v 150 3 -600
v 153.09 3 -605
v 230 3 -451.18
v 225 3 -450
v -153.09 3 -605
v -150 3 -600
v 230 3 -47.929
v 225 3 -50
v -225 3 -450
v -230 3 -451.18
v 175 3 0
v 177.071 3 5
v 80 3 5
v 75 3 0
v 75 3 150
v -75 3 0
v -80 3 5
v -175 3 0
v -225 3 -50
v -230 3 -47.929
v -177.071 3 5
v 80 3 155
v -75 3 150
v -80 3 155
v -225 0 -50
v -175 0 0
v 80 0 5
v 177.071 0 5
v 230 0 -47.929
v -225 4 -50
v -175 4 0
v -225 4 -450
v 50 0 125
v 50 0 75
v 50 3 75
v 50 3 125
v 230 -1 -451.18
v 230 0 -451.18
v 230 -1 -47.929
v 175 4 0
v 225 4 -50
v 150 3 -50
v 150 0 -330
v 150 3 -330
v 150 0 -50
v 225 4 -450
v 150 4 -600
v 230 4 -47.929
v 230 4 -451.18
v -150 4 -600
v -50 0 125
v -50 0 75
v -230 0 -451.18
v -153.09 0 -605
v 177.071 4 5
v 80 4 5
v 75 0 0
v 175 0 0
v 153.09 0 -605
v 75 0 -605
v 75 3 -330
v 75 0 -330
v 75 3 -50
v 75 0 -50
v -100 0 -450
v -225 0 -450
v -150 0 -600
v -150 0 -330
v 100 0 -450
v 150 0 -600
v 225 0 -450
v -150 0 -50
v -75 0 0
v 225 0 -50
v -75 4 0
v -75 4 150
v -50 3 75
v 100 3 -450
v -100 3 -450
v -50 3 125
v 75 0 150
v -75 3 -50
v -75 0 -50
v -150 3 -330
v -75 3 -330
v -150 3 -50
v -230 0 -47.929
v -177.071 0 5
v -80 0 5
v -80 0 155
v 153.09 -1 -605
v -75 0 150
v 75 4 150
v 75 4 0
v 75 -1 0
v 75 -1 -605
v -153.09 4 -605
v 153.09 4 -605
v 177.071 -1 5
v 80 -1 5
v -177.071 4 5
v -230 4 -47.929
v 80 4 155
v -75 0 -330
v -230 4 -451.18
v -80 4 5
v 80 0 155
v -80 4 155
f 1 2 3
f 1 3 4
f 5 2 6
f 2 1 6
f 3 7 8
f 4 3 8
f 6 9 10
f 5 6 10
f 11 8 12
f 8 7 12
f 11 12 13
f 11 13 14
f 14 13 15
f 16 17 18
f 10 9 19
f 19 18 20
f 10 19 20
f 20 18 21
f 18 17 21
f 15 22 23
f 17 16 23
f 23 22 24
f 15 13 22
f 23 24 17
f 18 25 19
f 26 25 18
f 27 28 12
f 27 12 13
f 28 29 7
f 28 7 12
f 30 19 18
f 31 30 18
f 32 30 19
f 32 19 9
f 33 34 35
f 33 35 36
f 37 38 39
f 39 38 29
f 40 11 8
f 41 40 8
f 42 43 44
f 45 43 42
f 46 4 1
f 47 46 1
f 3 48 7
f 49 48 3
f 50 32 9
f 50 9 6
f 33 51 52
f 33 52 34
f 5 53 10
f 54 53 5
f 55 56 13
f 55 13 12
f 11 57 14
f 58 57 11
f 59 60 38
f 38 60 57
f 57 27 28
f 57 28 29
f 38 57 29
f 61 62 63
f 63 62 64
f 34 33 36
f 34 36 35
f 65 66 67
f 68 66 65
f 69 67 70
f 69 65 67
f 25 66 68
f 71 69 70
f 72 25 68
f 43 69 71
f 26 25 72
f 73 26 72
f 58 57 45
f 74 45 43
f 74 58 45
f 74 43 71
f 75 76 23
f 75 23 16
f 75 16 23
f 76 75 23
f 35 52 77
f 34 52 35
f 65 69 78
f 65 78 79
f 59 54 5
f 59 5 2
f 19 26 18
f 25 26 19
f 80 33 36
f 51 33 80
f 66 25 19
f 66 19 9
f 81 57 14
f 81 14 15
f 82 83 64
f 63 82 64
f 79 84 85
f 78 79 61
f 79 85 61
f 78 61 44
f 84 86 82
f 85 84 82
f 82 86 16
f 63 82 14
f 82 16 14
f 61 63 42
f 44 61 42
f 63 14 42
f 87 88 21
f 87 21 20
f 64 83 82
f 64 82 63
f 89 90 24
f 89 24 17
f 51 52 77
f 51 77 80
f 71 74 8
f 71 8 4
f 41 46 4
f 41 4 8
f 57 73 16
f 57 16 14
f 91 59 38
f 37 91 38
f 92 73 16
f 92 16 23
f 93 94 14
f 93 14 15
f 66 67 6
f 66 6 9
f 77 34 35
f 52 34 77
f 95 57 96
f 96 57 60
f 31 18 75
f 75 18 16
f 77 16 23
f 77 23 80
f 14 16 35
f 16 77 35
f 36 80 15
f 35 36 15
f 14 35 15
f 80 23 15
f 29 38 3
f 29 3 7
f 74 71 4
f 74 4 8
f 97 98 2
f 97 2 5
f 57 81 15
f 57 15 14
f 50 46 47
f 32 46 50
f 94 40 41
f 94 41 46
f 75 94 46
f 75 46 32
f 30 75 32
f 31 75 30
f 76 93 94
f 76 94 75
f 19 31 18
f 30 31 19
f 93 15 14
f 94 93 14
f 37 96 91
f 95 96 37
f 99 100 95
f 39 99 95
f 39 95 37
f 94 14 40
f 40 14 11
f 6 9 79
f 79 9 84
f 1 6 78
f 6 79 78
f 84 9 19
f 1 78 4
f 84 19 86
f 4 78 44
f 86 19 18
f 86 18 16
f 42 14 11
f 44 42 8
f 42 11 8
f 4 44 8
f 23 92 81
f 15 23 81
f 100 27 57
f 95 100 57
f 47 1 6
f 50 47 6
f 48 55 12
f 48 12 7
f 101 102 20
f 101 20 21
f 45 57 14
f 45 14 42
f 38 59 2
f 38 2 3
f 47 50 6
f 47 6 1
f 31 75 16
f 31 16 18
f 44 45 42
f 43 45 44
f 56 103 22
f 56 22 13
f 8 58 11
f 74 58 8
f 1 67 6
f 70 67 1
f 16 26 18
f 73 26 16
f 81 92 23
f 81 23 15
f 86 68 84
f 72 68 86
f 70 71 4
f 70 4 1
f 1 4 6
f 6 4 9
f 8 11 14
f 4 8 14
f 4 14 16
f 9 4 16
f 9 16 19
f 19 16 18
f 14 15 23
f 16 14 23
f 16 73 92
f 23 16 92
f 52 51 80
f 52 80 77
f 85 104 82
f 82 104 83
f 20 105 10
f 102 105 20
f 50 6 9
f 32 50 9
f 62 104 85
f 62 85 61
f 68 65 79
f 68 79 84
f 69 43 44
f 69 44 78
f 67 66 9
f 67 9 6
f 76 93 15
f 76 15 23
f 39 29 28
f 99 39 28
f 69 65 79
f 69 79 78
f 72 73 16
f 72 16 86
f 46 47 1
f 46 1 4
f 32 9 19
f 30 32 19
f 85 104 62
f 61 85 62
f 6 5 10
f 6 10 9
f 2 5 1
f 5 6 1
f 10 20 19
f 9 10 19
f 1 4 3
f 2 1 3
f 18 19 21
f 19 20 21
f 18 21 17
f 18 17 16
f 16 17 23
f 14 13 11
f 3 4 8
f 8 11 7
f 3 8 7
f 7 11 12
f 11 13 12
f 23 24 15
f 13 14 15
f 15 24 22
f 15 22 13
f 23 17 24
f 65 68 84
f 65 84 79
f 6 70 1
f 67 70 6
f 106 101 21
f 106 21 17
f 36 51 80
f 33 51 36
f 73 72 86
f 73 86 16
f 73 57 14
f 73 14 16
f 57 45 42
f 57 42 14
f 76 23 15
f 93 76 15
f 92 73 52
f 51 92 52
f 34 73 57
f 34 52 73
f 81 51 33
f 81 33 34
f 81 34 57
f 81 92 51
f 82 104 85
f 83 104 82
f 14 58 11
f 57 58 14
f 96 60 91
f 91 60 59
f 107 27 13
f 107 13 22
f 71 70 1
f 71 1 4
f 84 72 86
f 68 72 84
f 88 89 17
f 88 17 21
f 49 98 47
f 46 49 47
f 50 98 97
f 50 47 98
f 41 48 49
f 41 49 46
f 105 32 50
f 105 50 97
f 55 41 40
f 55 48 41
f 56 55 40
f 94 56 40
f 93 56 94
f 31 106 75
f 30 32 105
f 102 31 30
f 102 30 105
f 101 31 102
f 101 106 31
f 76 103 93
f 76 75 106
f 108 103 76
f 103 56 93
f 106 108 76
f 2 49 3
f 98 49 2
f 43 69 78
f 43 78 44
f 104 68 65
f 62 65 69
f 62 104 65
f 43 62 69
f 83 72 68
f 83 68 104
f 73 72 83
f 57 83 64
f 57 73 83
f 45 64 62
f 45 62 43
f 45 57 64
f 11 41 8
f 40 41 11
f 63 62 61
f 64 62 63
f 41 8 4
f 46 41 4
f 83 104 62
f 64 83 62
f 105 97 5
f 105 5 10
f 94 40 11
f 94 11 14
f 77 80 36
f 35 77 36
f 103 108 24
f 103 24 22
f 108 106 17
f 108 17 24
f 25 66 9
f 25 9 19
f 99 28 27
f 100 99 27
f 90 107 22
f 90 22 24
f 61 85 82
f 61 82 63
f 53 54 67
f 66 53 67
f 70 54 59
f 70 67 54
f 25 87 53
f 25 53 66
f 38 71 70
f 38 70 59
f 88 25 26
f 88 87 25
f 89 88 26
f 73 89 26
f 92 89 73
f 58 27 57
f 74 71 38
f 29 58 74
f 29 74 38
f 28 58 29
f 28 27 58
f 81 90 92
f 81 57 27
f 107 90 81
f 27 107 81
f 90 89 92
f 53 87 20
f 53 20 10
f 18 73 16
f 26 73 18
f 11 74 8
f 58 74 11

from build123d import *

# Parameters (mm, degrees)
F1_DEPTH  = 3
F2_W      = 150
F2_H      = 150
F3_DEPTH  = 3
F4_W      = 150
F4_H      = 280
F5_DEPTH  = 3
F6_W      = 150
F6_H      = 280
F7_DEPTH  = 3
F9_DEPTH  = 3
F11_DEPTH = 3
F13_DEPTH = 1
F15_DEPTH = 1
F17_DEPTH = 1


with BuildPart() as f1:
    # F0 (on Front) → F1 (new body)
    with BuildSketch(Plane.XZ):
        Polygon((50, 125), (0, 125), (-50, 125), (-50, 100), (-50, 75), (0, 75), (50, 75), (50, 100), align=None)
    extrude(amount=-F1_DEPTH)


with BuildPart() as f3:
    # F2 (on Front) → F3 (new body)
    with BuildSketch(Plane.XZ):
        with Locations((0, 75)):
            Rectangle(F2_W, F2_H)
        Polygon((-50, 125), (0, 125), (50, 125), (50, 100), (50, 75), (0, 75), (-50, 75), (-50, 100), align=None, mode=Mode.SUBTRACT)
    extrude(amount=-F3_DEPTH)


with BuildPart() as f5:
    # F4 (on Front) → F5 (new body)
    with BuildSketch(Plane.XZ):
        with Locations((0, -190)):
            Rectangle(F4_W, F4_H)
    extrude(amount=-F5_DEPTH)


with BuildPart() as f7:
    # F6 (on Front) → F7 (new body)
    with BuildSketch(Plane.XZ):
        Polygon((75, 0), (-75, 0), (-150, -50), (-150, -330), (-100, -450), (100, -450), (150, -330), (150, -50), align=None)
        with Locations((0, -190)):
            Rectangle(F6_W, F6_H, mode=Mode.SUBTRACT)
    extrude(amount=-F7_DEPTH)


with BuildPart() as f9:
    # F8 (on face) → F9 (new body)
    with BuildSketch(Plane.XZ):
        Polygon((175, 0), (75, 0), (150, -50), (150, -330), (100, -450), (-100, -450), (-150, -330), (-150, -50), (-75, 0), (-175, 0), (-225, -50), (-225, -450), (-150, -600), (150, -600), (225, -450), (225, -50), align=None)
    extrude(amount=-F9_DEPTH)


with BuildPart() as f11:
    # F10 (on face) → F11 (new body)
    with BuildSketch(Plane.XZ):
        Polygon((230, -47.928932), (177.071068, 5), (80, 5), (80, 155), (-80, 155), (-80, 5), (-177.071068, 5), (-230, -47.928932), (-230, -451.18034), (-153.09017, -605), (153.09017, -605), (230, -451.18034), align=None)
        Polygon((-75, 150), (75, 150), (75, 0), (175, 0), (225, -50), (225, -450), (150, -600), (-150, -600), (-225, -450), (-225, -50), (-175, 0), (-75, 0), align=None, mode=Mode.SUBTRACT)
    extrude(amount=-F11_DEPTH)


with BuildPart() as f13:
    # F12 (on face) → F13 (new body)
    with BuildSketch(Plane(origin=(0, 3, 0), x_dir=(-1, 0, 0), z_dir=(0, 1, 0))):
        Polygon((75, 0), (75, 150), (-75, 150), (-75, 0), (-175, 0), (-225, -50), (-225, -450), (-150, -600), (150, -600), (225, -450), (225, -50), (175, 0), align=None)
    extrude(amount=F13_DEPTH)


with BuildPart() as f15:
    # F14 (on face) → F15 (new body)
    with BuildSketch(Plane(origin=(0, 4, 0), x_dir=(-1, 0, 0), z_dir=(0, 1, 0))):
        Polygon((80, 155), (-80, 155), (-80, 5), (-177.071068, 5), (-230, -47.928932), (-230, -451.18034), (-153.09017, -605), (153.09017, -605), (230, -451.18034), (230, -47.928932), (177.071068, 5), (80, 5), align=None)
        Polygon((-75, 0), (-75, 150), (75, 150), (75, 0), (175, 0), (225, -50), (225, -450), (150, -600), (-150, -600), (-225, -450), (-225, -50), (-175, 0), align=None, mode=Mode.SUBTRACT)
    extrude(amount=-F15_DEPTH)


with BuildPart() as f17:
    # F16 (on face) → F17 (new body)
    with BuildSketch(Plane.XZ):
        Polygon((177.071068, 5), (80, 5), (75, 0), (75, -605), (153.09017, -605), (230, -451.18034), (230, -47.928932), align=None)
    extrude(amount=F17_DEPTH)


solid = Compound([f1.part, f3.part, f5.part, f7.part, f9.part, f11.part, f13.part, f15.part, f17.part])
